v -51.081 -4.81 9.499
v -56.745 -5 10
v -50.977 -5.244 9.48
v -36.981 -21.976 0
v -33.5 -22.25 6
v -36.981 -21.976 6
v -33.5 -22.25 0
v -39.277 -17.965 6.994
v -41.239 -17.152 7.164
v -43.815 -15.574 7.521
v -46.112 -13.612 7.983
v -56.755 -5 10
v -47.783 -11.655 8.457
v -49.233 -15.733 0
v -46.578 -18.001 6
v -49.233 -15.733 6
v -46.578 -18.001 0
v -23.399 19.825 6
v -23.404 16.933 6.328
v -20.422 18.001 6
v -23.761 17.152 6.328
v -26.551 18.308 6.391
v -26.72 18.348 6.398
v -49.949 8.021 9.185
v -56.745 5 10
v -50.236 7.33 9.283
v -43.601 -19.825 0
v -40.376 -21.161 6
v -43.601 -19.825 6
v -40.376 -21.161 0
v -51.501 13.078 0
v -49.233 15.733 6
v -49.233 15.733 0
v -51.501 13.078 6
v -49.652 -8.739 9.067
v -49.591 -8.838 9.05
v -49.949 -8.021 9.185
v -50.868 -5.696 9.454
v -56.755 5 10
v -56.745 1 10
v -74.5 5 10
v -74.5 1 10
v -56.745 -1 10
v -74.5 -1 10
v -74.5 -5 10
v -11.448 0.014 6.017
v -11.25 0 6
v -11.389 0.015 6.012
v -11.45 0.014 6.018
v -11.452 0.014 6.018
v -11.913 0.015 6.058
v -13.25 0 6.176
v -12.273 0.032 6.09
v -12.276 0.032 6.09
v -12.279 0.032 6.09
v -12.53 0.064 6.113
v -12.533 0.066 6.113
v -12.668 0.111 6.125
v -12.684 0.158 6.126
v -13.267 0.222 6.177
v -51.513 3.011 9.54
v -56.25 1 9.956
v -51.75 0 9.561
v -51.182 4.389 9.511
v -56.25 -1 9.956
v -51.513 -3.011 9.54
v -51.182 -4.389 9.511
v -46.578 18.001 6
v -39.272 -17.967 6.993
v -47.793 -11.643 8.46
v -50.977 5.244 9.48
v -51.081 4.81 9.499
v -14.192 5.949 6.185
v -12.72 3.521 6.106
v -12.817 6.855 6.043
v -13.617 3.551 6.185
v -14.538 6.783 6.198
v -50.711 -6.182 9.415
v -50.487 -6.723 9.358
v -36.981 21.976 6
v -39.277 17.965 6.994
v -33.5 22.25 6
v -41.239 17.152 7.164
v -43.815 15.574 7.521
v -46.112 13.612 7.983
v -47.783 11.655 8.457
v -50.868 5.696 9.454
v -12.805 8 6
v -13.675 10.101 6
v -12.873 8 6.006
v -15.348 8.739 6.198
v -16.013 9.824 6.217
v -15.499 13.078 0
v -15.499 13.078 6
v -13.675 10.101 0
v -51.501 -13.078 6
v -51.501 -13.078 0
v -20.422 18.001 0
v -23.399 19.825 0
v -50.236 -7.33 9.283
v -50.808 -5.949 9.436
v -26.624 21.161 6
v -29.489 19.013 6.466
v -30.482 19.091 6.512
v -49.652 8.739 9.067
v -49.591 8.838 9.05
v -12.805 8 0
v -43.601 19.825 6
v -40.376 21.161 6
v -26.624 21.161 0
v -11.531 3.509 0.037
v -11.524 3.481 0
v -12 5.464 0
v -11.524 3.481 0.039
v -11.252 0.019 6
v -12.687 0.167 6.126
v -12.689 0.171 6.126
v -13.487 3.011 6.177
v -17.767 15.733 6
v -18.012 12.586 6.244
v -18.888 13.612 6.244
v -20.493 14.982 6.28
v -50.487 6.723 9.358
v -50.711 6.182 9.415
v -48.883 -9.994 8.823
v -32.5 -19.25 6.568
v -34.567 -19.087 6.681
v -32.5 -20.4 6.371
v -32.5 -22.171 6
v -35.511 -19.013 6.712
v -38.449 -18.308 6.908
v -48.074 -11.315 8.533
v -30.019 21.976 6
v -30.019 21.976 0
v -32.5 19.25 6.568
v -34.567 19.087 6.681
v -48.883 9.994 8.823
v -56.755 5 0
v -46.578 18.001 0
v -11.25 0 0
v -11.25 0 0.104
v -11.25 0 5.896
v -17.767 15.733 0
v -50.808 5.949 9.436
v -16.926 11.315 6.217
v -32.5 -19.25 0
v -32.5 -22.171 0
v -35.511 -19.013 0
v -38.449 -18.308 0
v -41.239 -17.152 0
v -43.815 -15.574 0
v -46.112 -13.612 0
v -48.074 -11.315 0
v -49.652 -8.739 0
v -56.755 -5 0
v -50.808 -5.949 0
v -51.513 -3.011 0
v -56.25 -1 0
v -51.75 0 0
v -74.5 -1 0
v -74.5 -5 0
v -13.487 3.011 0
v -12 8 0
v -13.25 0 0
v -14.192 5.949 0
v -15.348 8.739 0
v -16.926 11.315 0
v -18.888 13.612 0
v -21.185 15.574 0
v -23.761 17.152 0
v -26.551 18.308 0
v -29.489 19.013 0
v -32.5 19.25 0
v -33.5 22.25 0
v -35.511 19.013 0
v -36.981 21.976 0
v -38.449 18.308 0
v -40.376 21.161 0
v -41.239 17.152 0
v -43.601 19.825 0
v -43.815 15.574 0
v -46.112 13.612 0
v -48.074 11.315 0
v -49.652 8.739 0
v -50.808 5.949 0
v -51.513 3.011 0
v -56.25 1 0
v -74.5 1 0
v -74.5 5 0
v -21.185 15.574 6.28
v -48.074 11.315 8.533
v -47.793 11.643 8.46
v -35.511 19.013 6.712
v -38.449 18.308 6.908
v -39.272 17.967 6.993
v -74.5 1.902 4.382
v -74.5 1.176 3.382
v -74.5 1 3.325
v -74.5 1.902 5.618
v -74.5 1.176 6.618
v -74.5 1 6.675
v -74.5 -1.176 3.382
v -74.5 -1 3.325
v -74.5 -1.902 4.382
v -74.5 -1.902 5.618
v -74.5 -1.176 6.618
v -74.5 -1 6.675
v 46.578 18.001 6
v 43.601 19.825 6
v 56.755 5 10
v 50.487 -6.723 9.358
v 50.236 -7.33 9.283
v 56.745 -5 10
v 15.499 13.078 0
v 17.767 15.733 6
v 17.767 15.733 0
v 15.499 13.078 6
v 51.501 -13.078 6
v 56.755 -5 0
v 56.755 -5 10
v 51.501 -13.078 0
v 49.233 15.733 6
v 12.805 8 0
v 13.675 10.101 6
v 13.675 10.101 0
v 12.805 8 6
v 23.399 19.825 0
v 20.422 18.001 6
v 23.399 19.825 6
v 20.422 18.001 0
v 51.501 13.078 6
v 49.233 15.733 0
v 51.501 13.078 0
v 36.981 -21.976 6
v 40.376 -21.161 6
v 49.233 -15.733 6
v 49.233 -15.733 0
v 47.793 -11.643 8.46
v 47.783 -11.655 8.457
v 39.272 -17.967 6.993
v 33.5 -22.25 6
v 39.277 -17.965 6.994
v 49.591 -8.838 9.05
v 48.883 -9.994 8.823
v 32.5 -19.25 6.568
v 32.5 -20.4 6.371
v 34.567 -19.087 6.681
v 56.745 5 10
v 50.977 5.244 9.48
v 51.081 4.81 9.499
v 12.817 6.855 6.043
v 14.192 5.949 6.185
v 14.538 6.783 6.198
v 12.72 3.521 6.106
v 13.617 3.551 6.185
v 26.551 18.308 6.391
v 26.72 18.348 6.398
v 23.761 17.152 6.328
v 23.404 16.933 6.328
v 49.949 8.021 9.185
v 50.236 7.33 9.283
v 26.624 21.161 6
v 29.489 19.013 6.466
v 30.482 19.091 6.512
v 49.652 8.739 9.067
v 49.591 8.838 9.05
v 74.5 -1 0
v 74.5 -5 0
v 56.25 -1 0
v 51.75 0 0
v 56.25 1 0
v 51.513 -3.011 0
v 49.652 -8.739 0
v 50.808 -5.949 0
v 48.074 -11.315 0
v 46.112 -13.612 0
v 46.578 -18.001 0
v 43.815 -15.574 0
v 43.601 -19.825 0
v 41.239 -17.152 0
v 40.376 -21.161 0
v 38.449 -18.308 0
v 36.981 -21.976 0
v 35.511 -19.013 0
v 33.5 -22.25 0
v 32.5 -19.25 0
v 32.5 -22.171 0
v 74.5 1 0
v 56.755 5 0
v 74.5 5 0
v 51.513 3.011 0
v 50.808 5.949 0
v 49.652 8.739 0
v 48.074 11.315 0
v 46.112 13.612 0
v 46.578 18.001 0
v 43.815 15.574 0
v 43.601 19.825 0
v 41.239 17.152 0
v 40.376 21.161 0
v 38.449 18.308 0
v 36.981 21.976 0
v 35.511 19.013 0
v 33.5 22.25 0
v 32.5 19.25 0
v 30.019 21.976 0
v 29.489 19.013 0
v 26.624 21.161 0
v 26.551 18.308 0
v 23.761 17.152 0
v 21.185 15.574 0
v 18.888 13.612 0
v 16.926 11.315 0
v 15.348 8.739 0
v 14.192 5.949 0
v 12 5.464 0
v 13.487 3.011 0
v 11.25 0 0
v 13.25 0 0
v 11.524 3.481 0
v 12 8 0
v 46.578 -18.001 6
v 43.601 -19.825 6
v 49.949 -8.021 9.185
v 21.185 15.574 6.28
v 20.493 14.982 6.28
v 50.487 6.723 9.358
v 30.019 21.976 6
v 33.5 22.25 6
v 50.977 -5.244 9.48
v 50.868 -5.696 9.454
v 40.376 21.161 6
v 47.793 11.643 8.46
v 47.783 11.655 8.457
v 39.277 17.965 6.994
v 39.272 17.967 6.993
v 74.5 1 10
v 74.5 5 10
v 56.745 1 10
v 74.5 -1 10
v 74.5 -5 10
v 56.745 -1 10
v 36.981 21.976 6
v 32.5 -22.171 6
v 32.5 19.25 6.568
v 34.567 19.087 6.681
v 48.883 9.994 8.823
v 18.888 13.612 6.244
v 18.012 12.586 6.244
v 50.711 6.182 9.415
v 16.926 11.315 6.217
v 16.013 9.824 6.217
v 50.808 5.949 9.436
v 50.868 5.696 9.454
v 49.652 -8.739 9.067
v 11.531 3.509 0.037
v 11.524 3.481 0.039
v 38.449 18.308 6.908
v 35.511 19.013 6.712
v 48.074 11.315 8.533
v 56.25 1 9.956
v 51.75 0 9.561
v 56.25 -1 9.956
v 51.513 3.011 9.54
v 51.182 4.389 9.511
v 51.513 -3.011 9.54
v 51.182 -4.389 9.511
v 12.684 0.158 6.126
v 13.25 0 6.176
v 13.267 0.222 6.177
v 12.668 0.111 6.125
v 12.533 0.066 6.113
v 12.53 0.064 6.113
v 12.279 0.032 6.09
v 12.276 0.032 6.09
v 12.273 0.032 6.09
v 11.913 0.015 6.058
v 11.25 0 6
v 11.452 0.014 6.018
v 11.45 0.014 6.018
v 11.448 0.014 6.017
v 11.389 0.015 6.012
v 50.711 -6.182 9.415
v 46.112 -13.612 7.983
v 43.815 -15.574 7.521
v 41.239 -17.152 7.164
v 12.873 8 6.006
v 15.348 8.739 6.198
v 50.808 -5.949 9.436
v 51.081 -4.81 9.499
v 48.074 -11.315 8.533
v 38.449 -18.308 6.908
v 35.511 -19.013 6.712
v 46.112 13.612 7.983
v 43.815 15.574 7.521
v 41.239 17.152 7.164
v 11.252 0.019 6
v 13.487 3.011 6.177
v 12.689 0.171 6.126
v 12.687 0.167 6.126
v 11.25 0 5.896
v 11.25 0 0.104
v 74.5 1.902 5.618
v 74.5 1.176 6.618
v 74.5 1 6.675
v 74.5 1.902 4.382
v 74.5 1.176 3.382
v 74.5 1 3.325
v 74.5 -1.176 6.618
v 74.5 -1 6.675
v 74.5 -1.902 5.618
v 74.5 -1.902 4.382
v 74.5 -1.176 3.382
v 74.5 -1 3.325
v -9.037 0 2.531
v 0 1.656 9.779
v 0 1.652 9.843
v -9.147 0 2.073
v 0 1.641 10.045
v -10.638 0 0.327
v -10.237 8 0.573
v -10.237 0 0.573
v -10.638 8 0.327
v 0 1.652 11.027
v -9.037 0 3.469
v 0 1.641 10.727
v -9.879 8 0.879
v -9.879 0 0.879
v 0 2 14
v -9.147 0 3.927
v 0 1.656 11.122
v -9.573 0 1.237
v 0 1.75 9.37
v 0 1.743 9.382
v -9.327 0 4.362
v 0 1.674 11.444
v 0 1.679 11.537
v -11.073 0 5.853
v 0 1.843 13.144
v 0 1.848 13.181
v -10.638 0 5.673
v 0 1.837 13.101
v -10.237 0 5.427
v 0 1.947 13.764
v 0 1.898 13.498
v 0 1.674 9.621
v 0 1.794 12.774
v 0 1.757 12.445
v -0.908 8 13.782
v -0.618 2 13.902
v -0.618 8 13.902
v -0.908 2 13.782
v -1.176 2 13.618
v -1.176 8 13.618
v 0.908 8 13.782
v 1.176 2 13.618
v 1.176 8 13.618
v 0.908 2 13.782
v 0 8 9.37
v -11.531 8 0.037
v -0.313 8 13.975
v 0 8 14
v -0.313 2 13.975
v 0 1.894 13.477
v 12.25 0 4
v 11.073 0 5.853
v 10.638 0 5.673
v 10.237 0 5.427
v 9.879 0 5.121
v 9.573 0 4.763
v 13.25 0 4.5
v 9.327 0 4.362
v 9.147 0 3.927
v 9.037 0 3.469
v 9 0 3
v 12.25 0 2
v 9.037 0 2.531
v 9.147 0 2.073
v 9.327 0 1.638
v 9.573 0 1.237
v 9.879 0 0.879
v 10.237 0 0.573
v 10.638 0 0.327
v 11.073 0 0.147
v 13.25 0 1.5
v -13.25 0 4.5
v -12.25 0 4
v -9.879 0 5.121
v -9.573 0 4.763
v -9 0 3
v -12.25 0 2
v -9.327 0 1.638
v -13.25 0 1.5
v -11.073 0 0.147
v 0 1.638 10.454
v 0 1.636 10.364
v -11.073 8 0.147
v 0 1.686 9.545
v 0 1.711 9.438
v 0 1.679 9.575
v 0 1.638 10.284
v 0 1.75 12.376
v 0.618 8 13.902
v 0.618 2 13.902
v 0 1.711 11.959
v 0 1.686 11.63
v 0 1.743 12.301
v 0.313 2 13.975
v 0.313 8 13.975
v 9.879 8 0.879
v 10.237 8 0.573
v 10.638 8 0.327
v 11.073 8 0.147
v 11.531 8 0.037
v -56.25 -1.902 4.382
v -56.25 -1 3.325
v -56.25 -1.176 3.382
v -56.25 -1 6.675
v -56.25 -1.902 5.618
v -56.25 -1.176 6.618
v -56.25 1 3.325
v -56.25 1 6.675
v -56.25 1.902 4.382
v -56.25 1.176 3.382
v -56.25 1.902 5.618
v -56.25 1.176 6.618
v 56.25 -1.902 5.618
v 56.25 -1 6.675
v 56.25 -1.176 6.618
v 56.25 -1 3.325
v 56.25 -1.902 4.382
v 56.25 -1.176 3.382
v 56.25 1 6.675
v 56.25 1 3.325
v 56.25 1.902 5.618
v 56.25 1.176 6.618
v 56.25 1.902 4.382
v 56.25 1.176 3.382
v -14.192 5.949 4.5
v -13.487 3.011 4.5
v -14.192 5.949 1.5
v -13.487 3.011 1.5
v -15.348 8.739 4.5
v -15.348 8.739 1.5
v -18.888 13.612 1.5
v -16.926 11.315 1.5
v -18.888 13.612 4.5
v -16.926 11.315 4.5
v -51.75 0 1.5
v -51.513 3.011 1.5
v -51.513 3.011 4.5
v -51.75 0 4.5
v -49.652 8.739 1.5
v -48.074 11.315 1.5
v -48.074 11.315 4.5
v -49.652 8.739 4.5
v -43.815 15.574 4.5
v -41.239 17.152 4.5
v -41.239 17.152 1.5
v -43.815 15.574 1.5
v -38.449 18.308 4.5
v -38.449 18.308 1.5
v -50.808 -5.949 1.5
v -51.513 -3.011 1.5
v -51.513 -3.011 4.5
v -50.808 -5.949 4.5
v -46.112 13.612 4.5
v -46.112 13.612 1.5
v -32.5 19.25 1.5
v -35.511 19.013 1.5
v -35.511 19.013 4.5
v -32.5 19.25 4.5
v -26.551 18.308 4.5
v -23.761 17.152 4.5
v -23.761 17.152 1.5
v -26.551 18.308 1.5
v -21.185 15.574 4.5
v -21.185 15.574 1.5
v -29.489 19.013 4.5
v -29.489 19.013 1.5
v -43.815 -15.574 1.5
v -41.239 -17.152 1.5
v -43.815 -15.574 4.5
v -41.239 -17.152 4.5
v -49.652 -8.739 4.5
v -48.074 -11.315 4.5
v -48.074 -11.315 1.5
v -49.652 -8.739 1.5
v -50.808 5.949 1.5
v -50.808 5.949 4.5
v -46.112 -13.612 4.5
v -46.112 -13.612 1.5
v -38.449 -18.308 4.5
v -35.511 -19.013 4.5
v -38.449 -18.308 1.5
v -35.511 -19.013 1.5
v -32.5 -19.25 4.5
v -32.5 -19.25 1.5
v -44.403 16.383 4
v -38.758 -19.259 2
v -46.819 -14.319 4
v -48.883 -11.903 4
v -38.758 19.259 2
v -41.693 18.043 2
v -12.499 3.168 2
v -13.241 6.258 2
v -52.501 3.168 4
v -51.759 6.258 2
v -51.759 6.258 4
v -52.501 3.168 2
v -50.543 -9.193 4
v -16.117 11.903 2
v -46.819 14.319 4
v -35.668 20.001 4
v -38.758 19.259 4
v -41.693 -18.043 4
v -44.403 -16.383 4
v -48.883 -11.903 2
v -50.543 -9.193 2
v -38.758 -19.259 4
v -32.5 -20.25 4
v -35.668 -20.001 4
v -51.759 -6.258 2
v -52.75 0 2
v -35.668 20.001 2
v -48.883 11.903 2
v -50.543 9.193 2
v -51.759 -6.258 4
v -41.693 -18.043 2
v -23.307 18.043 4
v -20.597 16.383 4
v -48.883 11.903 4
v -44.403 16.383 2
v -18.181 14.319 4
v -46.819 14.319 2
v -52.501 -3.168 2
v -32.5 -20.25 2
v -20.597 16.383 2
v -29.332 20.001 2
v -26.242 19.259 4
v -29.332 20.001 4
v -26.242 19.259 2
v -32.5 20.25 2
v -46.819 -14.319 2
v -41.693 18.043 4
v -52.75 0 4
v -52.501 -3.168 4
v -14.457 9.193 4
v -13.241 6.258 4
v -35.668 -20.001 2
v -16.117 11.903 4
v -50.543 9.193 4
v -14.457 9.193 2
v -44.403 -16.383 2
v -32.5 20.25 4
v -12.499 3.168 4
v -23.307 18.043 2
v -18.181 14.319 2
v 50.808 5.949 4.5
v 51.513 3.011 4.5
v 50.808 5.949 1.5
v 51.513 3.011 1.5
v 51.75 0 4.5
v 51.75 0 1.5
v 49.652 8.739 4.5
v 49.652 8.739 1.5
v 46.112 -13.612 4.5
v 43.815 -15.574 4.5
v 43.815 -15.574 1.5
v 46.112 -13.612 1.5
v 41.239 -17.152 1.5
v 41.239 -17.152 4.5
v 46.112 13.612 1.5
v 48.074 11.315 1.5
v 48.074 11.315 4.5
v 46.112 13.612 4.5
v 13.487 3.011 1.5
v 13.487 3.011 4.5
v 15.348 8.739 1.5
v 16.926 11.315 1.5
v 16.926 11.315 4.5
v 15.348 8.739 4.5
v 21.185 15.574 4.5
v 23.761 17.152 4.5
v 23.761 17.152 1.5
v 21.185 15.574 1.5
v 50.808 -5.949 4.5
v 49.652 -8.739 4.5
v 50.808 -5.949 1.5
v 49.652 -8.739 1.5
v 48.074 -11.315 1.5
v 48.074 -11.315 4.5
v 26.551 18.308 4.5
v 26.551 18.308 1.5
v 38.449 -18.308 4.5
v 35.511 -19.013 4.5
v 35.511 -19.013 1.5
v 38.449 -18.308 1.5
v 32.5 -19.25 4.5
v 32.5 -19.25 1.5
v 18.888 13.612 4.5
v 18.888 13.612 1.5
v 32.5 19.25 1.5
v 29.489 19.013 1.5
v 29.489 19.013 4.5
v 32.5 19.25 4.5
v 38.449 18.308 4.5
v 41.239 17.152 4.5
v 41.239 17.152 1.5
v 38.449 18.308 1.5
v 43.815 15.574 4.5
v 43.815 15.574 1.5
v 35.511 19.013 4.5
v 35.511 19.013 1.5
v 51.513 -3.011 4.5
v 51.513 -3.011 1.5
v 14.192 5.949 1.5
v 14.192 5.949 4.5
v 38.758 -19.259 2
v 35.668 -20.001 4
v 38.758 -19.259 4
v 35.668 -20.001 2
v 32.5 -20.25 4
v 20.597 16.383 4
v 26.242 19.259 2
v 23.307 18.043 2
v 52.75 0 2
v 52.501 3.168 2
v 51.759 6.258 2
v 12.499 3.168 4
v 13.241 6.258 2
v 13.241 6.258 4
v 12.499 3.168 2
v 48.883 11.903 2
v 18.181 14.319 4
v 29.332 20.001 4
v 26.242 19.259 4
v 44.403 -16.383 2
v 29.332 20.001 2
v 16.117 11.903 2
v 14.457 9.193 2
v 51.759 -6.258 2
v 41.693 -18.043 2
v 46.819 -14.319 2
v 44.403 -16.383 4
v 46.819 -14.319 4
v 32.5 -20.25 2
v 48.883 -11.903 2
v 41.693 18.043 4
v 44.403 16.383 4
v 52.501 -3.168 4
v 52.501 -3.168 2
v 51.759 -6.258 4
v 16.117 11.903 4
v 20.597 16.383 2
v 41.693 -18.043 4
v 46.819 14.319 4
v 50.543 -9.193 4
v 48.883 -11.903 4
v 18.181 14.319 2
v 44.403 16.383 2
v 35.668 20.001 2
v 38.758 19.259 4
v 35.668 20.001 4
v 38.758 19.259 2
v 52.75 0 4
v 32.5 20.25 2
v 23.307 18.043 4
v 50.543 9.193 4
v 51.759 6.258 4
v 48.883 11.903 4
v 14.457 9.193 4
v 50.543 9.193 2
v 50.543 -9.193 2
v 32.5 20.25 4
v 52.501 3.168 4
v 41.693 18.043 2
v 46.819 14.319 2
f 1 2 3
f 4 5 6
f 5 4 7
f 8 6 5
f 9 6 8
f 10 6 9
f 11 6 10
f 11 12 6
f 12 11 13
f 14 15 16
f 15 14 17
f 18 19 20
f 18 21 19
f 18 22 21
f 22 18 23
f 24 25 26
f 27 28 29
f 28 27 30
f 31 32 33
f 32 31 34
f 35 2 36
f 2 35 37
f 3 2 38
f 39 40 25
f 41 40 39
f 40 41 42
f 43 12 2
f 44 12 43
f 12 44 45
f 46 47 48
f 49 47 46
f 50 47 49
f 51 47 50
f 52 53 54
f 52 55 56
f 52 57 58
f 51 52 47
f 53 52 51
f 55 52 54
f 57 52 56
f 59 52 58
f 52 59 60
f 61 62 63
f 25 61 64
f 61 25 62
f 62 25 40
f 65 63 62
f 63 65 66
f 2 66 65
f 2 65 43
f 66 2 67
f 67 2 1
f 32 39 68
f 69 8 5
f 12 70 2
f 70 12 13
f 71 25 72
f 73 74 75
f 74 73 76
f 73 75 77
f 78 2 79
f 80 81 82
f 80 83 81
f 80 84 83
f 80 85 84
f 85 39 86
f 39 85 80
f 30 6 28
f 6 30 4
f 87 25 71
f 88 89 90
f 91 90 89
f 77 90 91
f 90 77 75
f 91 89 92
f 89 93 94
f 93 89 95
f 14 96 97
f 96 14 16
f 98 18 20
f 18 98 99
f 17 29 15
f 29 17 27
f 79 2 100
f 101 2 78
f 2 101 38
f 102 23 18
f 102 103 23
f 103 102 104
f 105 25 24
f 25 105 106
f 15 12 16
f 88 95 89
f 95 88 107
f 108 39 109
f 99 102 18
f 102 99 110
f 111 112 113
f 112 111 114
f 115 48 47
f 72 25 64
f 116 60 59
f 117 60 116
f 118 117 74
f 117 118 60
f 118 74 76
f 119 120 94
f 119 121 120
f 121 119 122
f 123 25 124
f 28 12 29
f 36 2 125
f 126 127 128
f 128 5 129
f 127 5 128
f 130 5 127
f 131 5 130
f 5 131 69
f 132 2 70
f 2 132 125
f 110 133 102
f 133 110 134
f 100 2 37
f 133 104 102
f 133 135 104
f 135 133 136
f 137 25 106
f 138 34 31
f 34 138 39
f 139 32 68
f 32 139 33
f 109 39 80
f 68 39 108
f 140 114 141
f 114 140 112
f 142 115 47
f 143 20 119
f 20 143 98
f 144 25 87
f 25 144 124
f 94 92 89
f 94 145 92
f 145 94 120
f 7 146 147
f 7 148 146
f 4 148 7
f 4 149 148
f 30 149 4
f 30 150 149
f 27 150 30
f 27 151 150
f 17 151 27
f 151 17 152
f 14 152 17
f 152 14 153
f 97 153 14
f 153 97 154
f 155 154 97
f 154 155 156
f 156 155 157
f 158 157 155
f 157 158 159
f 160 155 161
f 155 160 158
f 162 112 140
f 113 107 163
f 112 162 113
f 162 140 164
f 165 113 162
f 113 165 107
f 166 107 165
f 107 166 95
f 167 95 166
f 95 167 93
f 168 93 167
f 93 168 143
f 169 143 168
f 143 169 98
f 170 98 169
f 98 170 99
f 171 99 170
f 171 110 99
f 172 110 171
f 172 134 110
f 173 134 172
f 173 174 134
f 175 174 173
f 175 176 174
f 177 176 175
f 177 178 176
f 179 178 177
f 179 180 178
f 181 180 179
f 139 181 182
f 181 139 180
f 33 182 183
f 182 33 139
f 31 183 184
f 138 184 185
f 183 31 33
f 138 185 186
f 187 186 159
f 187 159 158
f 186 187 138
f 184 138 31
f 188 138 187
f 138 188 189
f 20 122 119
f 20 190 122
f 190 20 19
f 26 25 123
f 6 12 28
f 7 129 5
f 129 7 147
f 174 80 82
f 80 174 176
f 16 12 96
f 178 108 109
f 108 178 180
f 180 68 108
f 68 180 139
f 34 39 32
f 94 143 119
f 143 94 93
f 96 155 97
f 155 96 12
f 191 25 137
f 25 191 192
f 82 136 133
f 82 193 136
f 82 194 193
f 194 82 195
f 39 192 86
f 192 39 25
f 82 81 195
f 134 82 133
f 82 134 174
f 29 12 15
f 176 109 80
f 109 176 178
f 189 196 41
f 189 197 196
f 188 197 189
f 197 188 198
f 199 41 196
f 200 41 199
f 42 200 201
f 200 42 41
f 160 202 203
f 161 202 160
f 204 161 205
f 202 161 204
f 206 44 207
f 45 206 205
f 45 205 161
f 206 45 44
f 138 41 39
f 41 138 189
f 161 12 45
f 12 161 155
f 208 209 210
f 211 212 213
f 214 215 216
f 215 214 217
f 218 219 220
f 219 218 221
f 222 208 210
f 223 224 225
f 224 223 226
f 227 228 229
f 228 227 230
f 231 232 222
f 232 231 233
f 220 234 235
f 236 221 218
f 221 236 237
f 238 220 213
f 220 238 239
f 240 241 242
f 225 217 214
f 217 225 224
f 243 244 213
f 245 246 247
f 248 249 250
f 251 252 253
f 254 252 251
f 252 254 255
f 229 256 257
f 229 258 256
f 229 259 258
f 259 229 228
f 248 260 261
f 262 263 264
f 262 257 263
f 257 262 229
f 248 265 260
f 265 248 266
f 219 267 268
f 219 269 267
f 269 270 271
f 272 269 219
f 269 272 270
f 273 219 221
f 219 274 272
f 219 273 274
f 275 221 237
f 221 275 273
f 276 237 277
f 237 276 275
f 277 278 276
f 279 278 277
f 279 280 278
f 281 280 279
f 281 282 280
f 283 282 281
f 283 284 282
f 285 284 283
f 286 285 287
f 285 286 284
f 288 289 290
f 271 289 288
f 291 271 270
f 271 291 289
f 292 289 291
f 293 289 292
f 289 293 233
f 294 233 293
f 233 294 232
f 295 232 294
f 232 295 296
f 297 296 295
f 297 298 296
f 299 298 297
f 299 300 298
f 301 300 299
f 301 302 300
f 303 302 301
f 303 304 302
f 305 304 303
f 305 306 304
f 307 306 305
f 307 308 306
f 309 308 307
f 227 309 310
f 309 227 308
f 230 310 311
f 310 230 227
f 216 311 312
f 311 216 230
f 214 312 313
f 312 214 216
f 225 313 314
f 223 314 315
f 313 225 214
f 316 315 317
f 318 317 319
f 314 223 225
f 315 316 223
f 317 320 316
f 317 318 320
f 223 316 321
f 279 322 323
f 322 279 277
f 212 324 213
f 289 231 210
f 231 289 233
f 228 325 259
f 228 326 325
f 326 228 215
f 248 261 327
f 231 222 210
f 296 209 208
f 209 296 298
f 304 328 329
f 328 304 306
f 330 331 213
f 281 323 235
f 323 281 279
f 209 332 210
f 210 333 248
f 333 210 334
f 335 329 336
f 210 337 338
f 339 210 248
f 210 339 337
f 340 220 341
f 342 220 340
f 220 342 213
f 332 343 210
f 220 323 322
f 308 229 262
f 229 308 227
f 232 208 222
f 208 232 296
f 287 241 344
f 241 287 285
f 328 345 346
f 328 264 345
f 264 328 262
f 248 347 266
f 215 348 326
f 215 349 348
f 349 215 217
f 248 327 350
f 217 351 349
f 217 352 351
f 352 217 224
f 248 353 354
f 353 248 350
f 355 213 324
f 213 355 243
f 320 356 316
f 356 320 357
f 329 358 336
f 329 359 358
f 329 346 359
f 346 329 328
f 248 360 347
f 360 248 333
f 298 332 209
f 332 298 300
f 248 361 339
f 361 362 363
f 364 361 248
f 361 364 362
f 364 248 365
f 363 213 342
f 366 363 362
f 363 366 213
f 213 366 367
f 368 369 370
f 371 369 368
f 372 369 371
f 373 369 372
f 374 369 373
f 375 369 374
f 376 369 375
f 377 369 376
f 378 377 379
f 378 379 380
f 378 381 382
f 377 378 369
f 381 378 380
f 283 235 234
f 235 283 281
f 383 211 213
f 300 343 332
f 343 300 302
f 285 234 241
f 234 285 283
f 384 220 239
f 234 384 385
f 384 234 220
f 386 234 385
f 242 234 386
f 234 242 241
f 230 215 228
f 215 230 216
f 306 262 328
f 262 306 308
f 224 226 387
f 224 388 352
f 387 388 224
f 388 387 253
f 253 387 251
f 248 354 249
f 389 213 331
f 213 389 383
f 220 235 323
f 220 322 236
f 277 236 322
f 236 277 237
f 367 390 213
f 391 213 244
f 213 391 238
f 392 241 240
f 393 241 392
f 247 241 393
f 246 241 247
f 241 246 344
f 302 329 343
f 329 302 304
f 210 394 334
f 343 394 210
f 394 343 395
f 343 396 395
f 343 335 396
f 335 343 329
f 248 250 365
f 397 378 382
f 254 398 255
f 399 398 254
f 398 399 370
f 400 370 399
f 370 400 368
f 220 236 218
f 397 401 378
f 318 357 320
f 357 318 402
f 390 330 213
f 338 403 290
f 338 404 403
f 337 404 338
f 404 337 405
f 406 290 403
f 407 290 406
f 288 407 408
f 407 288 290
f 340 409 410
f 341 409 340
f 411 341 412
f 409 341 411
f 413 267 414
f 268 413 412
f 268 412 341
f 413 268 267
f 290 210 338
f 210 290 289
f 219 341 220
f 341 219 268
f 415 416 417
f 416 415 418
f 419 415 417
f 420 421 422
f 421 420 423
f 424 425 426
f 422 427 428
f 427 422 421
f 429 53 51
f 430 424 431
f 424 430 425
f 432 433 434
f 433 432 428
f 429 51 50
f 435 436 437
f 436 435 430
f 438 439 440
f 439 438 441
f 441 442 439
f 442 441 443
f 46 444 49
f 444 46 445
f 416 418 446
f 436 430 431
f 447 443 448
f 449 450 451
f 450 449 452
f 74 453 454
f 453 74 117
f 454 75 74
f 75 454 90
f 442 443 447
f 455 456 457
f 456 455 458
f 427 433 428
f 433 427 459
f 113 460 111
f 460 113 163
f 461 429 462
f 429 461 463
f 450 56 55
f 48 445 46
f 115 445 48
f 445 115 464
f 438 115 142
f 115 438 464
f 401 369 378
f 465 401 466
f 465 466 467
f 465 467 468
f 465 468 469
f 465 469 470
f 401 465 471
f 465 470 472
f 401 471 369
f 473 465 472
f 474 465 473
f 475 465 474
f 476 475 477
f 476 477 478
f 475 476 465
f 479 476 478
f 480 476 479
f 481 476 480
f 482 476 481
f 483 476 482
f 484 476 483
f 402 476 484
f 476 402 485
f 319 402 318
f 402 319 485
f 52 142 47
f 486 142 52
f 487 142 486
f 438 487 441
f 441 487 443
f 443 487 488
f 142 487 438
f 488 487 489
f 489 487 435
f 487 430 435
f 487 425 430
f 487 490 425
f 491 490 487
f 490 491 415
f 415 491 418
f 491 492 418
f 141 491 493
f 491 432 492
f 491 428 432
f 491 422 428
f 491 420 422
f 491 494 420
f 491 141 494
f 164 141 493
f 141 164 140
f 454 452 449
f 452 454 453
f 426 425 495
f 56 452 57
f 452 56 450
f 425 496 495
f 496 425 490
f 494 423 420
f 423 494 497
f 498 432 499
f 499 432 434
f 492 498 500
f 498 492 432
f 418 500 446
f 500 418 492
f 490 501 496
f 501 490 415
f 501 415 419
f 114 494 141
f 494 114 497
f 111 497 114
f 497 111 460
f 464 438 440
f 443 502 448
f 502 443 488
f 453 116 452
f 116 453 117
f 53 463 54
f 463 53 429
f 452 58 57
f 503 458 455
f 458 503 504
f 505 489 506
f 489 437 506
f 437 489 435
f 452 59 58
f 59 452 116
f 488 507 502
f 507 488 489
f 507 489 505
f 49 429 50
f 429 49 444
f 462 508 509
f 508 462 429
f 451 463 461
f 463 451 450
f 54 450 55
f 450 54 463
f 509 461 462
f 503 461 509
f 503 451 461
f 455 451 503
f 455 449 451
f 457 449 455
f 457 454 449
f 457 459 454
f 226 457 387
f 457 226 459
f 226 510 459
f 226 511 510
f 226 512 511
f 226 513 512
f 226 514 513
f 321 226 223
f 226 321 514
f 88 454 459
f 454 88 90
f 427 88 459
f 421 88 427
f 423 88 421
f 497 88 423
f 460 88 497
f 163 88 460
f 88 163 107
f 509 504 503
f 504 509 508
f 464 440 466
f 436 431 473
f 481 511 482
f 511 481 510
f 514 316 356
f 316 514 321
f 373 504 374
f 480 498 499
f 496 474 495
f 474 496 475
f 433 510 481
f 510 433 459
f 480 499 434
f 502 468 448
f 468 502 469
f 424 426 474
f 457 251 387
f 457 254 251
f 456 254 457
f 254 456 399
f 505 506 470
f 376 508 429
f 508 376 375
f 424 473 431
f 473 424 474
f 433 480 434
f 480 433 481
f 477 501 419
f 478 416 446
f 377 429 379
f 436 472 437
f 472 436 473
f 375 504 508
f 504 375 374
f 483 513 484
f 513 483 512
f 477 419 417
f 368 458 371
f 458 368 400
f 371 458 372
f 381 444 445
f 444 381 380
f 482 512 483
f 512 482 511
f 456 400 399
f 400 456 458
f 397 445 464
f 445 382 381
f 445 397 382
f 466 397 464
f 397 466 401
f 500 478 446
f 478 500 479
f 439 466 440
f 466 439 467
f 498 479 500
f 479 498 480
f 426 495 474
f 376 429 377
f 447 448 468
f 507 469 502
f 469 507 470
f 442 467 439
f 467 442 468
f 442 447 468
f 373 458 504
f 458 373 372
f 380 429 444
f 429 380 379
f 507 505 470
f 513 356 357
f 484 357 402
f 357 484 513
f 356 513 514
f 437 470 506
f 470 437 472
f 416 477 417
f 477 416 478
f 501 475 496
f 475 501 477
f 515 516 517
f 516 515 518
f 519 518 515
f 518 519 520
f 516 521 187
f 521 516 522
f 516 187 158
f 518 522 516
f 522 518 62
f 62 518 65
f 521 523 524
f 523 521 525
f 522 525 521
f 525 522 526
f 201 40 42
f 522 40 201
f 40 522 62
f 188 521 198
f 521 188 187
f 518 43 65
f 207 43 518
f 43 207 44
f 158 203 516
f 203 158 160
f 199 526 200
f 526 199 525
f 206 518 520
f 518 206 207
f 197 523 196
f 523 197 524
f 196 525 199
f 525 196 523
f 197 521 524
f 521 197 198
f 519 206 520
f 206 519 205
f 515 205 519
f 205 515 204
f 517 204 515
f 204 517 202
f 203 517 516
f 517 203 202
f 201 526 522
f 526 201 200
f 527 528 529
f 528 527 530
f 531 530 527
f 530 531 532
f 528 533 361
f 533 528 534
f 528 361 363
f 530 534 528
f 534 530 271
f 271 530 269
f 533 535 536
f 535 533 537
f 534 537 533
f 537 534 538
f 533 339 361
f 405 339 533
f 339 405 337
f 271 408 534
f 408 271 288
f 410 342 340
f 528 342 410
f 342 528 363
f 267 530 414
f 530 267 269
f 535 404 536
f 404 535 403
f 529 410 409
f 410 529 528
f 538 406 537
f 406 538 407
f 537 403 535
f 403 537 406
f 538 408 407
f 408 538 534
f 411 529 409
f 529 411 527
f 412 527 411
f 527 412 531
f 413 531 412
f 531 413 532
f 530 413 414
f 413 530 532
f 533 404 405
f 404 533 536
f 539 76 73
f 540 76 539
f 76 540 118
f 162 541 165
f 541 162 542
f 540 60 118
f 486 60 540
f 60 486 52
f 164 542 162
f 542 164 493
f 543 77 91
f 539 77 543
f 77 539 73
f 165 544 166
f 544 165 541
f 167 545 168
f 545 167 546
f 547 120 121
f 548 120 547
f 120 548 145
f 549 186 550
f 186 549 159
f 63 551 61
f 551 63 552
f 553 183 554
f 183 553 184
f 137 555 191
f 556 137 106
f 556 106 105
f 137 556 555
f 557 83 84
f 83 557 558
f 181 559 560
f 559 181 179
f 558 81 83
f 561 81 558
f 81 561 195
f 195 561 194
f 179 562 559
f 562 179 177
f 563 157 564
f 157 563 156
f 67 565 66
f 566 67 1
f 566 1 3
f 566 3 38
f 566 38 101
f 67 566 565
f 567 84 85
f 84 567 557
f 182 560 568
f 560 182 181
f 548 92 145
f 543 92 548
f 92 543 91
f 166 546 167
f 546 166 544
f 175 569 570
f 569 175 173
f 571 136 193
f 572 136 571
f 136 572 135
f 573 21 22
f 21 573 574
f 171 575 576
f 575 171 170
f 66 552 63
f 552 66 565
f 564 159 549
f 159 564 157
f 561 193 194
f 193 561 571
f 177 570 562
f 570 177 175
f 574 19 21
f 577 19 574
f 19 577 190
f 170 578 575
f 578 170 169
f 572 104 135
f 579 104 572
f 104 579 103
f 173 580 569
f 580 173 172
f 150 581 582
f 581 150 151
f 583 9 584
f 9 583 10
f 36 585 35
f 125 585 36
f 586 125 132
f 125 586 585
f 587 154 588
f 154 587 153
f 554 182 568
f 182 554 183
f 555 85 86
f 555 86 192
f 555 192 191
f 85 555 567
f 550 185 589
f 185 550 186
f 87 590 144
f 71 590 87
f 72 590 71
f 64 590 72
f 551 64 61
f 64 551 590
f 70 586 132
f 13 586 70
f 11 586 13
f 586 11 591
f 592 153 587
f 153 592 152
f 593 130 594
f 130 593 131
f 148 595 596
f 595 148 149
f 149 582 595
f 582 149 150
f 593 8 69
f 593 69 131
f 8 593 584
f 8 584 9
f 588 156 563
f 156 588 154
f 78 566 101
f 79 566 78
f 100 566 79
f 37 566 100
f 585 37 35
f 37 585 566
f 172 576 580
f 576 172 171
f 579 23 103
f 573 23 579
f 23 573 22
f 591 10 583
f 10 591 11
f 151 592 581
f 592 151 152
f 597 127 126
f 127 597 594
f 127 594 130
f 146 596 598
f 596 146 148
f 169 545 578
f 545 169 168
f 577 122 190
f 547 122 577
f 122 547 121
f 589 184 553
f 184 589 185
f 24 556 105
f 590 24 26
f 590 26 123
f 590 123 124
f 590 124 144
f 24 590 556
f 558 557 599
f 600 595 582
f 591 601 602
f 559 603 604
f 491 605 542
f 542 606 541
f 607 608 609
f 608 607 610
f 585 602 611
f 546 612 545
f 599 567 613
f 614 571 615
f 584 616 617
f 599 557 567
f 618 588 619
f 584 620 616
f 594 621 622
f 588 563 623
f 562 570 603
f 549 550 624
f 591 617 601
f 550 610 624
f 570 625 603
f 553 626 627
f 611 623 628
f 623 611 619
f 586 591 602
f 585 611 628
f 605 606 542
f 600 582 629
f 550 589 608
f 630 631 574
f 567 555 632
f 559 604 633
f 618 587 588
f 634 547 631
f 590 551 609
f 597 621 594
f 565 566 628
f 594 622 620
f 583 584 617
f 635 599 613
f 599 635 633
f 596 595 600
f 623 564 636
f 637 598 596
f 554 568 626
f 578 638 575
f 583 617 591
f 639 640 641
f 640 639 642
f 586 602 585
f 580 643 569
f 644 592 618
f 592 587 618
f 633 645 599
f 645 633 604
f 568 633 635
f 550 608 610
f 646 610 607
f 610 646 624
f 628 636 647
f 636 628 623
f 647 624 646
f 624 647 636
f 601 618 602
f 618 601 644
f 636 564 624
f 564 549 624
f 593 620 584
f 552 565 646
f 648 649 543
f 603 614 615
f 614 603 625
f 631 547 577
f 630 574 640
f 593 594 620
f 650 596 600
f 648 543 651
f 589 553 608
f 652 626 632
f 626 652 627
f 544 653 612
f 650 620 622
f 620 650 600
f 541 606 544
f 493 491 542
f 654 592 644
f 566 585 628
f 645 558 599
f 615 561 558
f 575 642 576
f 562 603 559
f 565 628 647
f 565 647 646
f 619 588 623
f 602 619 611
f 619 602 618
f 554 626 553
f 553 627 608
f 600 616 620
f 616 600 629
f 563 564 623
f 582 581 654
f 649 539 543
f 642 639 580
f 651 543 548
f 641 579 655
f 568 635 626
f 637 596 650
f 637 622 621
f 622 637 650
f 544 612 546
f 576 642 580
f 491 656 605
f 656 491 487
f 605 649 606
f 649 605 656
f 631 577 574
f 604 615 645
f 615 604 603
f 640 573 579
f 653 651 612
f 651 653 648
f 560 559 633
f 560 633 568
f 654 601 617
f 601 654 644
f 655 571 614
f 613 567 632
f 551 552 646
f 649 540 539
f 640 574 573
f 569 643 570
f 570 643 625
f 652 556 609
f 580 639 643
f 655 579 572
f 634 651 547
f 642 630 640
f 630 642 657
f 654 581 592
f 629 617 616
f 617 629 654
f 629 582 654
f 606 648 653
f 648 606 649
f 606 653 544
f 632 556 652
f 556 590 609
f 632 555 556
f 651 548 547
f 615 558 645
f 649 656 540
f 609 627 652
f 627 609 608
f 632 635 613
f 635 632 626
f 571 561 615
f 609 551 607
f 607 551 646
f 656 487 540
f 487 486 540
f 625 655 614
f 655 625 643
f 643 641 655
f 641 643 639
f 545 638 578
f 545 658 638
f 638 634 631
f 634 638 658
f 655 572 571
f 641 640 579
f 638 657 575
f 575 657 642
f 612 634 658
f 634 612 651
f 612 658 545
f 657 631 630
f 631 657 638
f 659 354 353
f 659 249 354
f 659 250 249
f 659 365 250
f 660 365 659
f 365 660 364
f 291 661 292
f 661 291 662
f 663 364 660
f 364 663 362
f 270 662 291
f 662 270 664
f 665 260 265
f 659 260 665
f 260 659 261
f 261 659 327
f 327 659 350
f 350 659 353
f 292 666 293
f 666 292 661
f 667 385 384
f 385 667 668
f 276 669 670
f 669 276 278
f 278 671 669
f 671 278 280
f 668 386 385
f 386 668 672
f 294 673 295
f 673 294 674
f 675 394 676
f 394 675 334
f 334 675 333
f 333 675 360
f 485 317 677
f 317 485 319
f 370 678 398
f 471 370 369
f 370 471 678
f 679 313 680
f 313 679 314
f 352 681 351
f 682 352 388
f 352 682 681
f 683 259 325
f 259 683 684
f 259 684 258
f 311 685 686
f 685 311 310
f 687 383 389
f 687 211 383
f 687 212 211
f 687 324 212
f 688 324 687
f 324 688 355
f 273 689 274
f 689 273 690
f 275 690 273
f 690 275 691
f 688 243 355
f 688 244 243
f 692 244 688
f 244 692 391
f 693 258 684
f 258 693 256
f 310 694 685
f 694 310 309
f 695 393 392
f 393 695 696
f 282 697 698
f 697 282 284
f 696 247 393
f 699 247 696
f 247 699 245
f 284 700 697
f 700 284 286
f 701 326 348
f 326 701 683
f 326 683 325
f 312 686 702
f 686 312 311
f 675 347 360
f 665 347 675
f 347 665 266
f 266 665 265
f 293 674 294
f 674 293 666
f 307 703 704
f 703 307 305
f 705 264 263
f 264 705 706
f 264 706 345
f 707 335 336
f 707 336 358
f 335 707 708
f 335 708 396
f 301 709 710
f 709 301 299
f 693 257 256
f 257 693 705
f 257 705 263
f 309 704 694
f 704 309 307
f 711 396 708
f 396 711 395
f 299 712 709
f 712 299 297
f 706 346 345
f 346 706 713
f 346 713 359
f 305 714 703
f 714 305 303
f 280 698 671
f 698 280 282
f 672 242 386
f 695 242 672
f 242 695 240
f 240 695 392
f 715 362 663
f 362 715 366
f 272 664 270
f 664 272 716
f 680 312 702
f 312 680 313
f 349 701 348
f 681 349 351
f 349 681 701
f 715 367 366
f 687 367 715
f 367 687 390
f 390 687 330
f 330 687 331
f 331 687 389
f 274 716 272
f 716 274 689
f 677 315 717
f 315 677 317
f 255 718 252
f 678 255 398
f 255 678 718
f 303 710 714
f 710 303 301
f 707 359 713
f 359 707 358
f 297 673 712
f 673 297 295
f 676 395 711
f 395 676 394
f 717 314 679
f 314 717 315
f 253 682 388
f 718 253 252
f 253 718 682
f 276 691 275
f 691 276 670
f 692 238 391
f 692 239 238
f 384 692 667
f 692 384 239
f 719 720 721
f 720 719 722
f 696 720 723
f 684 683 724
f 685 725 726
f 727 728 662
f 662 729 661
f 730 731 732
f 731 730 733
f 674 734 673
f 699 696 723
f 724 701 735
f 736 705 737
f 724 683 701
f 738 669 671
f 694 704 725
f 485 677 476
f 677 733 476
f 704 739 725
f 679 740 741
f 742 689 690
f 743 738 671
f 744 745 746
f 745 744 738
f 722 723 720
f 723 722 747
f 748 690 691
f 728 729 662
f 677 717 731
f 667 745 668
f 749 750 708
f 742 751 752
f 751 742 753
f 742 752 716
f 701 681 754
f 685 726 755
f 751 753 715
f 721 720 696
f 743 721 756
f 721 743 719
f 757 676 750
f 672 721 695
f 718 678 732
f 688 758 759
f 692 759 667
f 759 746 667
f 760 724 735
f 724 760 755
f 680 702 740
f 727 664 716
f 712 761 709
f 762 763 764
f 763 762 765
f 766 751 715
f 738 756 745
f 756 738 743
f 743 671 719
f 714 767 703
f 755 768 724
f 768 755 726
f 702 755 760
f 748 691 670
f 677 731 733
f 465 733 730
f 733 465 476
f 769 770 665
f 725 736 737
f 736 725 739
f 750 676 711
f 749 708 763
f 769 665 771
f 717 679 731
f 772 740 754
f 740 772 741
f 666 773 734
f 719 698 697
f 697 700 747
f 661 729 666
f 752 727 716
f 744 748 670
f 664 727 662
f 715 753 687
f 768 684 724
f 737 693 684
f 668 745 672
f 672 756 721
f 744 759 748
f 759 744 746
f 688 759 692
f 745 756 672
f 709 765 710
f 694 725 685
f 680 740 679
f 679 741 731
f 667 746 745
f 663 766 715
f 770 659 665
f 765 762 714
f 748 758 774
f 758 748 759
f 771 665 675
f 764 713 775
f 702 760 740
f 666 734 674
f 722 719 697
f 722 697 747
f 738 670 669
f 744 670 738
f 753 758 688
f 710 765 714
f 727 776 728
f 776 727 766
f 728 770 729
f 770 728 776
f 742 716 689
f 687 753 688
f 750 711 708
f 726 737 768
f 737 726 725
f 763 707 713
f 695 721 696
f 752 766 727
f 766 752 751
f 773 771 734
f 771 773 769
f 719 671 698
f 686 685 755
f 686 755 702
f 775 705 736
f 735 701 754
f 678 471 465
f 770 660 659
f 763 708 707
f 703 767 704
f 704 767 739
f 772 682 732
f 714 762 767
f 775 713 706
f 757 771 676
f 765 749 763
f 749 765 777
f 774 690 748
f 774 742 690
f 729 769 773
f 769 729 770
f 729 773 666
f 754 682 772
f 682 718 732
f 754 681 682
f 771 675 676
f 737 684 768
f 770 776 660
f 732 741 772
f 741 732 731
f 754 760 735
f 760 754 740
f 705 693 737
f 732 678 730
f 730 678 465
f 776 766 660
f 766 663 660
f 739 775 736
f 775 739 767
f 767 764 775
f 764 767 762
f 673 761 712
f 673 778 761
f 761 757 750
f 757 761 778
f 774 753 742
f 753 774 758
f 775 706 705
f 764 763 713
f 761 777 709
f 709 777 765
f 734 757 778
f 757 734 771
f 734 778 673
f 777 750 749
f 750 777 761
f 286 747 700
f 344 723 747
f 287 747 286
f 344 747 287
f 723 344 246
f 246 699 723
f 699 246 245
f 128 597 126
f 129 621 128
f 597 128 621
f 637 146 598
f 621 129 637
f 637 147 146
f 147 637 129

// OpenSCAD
// parametric lens holder for Note4 VR OpenDive Headset (and others)

IPD = 65; // Inter-Pupillary Distance. How far apart the center of the two lenses will be.
lensSize1 = 40.5; // diameter of one of the lenses you are using
lensSize2 = 40.5; // diameter of the other lens you are using
visorWidth = 149; // outer width of the visor.  this is how wide the lens clip will be
slotWidth = 10; // how wide the slots for the lens clip are
lensThickness = 2; // thickness of the edge of the lens

/* [Hidden] */
$fn=40;
lensLip = 1; // how big the rim of plastic holding the lens in will be
mountStart = (IPD+(lensSize1 + lensSize2)/2)/2 + 4; // an intermediate value
mountMid = (visorWidth/2-mountStart)/2 + mountStart;

lensClip();

module lensClip()
{
	difference ()
	{
		union()
		{
			hull()
			{
				translate([-(IPD/2+1),0,lensThickness/2 + 2])	cylinder(r=lensSize1/2 + 2, h=lensThickness +4, center=true);
				translate([-mountStart, 0, 5]) cube([.01, slotWidth, 10], center=true);
			}
			translate([-mountMid, 0, 5]) cube([visorWidth/2 - mountStart, slotWidth, 10], center=true);

			hull()
			{
				translate([(IPD/2+1),0,lensThickness/2 + 2])	cylinder(r=lensSize2/2 + 2, h=lensThickness +4, center=true);
				translate([mountStart, 0, 5]) cube([.01, slotWidth, 10], center=true);
			}
			translate([mountMid, 0, 5]) cube([visorWidth/2 - mountStart, slotWidth, 10], center=true);
			
			// crosspiece
			hull()
			{
				translate([0, 5, 12]) rotate([90,0,0]) cylinder(r=2,h=6,center=true);
				translate([-12, 4, 3]) rotate([90,0,0]) cylinder(r=3,h=8,center=true);
			}
			hull()
			{
				translate([0, 5, 12]) rotate([90,0,0]) cylinder(r=2,h=6,center=true);
				translate([12, 4, 3]) rotate([90,0,0]) cylinder(r=3,h=8,center=true);
			}
			translate([-(IPD/4 + 6),4,3]) cube([IPD/2-12,8,6], center=true);
			translate([(IPD/4 + 6),4,3]) cube([IPD/2-12,8,6], center=true);
		}
	
	// slot mount cutouts
	translate ([-mountMid, 0, 5])
	{
		cube([visorWidth/2 - mountStart + 1, 2, 11],center=true);
		rotate([0,90,0]) cylinder(r=2, h=visorWidth/2 - mountStart + 1, center=true, $fn=10);
	}

	translate ([mountMid, 0, 5])
	{
		cube([visorWidth/2 - mountStart + 1, 2, 11],center=true);
		rotate([0,90,0]) cylinder(r=2, h=visorWidth/2 - mountStart + 1, center=true, $fn=10);
	}
	// lens cutouts
	translate ([-IPD/2,0,lensThickness/2 + 2]) lensCutOut(lensSize1);
	translate ([IPD/2,0,lensThickness/2 + 2]) lensCutOut(lensSize2);
	
	// lens gap
	translate([0,-50,3]) cube([IPD,100,50], center=true);

	}
}

module lensCutOut(lensSize)
{
	union()
	{
		cylinder(r=lensSize/2 - lensLip, h=100, center=true);
		
		// creating a bevel
		hull()
		{
			cylinder(r=lensSize/2, h=lensThickness, center=true);
			cylinder(r=lensSize/2-lensLip, h=lensThickness + lensLip, center=true);
		}
	}
}
